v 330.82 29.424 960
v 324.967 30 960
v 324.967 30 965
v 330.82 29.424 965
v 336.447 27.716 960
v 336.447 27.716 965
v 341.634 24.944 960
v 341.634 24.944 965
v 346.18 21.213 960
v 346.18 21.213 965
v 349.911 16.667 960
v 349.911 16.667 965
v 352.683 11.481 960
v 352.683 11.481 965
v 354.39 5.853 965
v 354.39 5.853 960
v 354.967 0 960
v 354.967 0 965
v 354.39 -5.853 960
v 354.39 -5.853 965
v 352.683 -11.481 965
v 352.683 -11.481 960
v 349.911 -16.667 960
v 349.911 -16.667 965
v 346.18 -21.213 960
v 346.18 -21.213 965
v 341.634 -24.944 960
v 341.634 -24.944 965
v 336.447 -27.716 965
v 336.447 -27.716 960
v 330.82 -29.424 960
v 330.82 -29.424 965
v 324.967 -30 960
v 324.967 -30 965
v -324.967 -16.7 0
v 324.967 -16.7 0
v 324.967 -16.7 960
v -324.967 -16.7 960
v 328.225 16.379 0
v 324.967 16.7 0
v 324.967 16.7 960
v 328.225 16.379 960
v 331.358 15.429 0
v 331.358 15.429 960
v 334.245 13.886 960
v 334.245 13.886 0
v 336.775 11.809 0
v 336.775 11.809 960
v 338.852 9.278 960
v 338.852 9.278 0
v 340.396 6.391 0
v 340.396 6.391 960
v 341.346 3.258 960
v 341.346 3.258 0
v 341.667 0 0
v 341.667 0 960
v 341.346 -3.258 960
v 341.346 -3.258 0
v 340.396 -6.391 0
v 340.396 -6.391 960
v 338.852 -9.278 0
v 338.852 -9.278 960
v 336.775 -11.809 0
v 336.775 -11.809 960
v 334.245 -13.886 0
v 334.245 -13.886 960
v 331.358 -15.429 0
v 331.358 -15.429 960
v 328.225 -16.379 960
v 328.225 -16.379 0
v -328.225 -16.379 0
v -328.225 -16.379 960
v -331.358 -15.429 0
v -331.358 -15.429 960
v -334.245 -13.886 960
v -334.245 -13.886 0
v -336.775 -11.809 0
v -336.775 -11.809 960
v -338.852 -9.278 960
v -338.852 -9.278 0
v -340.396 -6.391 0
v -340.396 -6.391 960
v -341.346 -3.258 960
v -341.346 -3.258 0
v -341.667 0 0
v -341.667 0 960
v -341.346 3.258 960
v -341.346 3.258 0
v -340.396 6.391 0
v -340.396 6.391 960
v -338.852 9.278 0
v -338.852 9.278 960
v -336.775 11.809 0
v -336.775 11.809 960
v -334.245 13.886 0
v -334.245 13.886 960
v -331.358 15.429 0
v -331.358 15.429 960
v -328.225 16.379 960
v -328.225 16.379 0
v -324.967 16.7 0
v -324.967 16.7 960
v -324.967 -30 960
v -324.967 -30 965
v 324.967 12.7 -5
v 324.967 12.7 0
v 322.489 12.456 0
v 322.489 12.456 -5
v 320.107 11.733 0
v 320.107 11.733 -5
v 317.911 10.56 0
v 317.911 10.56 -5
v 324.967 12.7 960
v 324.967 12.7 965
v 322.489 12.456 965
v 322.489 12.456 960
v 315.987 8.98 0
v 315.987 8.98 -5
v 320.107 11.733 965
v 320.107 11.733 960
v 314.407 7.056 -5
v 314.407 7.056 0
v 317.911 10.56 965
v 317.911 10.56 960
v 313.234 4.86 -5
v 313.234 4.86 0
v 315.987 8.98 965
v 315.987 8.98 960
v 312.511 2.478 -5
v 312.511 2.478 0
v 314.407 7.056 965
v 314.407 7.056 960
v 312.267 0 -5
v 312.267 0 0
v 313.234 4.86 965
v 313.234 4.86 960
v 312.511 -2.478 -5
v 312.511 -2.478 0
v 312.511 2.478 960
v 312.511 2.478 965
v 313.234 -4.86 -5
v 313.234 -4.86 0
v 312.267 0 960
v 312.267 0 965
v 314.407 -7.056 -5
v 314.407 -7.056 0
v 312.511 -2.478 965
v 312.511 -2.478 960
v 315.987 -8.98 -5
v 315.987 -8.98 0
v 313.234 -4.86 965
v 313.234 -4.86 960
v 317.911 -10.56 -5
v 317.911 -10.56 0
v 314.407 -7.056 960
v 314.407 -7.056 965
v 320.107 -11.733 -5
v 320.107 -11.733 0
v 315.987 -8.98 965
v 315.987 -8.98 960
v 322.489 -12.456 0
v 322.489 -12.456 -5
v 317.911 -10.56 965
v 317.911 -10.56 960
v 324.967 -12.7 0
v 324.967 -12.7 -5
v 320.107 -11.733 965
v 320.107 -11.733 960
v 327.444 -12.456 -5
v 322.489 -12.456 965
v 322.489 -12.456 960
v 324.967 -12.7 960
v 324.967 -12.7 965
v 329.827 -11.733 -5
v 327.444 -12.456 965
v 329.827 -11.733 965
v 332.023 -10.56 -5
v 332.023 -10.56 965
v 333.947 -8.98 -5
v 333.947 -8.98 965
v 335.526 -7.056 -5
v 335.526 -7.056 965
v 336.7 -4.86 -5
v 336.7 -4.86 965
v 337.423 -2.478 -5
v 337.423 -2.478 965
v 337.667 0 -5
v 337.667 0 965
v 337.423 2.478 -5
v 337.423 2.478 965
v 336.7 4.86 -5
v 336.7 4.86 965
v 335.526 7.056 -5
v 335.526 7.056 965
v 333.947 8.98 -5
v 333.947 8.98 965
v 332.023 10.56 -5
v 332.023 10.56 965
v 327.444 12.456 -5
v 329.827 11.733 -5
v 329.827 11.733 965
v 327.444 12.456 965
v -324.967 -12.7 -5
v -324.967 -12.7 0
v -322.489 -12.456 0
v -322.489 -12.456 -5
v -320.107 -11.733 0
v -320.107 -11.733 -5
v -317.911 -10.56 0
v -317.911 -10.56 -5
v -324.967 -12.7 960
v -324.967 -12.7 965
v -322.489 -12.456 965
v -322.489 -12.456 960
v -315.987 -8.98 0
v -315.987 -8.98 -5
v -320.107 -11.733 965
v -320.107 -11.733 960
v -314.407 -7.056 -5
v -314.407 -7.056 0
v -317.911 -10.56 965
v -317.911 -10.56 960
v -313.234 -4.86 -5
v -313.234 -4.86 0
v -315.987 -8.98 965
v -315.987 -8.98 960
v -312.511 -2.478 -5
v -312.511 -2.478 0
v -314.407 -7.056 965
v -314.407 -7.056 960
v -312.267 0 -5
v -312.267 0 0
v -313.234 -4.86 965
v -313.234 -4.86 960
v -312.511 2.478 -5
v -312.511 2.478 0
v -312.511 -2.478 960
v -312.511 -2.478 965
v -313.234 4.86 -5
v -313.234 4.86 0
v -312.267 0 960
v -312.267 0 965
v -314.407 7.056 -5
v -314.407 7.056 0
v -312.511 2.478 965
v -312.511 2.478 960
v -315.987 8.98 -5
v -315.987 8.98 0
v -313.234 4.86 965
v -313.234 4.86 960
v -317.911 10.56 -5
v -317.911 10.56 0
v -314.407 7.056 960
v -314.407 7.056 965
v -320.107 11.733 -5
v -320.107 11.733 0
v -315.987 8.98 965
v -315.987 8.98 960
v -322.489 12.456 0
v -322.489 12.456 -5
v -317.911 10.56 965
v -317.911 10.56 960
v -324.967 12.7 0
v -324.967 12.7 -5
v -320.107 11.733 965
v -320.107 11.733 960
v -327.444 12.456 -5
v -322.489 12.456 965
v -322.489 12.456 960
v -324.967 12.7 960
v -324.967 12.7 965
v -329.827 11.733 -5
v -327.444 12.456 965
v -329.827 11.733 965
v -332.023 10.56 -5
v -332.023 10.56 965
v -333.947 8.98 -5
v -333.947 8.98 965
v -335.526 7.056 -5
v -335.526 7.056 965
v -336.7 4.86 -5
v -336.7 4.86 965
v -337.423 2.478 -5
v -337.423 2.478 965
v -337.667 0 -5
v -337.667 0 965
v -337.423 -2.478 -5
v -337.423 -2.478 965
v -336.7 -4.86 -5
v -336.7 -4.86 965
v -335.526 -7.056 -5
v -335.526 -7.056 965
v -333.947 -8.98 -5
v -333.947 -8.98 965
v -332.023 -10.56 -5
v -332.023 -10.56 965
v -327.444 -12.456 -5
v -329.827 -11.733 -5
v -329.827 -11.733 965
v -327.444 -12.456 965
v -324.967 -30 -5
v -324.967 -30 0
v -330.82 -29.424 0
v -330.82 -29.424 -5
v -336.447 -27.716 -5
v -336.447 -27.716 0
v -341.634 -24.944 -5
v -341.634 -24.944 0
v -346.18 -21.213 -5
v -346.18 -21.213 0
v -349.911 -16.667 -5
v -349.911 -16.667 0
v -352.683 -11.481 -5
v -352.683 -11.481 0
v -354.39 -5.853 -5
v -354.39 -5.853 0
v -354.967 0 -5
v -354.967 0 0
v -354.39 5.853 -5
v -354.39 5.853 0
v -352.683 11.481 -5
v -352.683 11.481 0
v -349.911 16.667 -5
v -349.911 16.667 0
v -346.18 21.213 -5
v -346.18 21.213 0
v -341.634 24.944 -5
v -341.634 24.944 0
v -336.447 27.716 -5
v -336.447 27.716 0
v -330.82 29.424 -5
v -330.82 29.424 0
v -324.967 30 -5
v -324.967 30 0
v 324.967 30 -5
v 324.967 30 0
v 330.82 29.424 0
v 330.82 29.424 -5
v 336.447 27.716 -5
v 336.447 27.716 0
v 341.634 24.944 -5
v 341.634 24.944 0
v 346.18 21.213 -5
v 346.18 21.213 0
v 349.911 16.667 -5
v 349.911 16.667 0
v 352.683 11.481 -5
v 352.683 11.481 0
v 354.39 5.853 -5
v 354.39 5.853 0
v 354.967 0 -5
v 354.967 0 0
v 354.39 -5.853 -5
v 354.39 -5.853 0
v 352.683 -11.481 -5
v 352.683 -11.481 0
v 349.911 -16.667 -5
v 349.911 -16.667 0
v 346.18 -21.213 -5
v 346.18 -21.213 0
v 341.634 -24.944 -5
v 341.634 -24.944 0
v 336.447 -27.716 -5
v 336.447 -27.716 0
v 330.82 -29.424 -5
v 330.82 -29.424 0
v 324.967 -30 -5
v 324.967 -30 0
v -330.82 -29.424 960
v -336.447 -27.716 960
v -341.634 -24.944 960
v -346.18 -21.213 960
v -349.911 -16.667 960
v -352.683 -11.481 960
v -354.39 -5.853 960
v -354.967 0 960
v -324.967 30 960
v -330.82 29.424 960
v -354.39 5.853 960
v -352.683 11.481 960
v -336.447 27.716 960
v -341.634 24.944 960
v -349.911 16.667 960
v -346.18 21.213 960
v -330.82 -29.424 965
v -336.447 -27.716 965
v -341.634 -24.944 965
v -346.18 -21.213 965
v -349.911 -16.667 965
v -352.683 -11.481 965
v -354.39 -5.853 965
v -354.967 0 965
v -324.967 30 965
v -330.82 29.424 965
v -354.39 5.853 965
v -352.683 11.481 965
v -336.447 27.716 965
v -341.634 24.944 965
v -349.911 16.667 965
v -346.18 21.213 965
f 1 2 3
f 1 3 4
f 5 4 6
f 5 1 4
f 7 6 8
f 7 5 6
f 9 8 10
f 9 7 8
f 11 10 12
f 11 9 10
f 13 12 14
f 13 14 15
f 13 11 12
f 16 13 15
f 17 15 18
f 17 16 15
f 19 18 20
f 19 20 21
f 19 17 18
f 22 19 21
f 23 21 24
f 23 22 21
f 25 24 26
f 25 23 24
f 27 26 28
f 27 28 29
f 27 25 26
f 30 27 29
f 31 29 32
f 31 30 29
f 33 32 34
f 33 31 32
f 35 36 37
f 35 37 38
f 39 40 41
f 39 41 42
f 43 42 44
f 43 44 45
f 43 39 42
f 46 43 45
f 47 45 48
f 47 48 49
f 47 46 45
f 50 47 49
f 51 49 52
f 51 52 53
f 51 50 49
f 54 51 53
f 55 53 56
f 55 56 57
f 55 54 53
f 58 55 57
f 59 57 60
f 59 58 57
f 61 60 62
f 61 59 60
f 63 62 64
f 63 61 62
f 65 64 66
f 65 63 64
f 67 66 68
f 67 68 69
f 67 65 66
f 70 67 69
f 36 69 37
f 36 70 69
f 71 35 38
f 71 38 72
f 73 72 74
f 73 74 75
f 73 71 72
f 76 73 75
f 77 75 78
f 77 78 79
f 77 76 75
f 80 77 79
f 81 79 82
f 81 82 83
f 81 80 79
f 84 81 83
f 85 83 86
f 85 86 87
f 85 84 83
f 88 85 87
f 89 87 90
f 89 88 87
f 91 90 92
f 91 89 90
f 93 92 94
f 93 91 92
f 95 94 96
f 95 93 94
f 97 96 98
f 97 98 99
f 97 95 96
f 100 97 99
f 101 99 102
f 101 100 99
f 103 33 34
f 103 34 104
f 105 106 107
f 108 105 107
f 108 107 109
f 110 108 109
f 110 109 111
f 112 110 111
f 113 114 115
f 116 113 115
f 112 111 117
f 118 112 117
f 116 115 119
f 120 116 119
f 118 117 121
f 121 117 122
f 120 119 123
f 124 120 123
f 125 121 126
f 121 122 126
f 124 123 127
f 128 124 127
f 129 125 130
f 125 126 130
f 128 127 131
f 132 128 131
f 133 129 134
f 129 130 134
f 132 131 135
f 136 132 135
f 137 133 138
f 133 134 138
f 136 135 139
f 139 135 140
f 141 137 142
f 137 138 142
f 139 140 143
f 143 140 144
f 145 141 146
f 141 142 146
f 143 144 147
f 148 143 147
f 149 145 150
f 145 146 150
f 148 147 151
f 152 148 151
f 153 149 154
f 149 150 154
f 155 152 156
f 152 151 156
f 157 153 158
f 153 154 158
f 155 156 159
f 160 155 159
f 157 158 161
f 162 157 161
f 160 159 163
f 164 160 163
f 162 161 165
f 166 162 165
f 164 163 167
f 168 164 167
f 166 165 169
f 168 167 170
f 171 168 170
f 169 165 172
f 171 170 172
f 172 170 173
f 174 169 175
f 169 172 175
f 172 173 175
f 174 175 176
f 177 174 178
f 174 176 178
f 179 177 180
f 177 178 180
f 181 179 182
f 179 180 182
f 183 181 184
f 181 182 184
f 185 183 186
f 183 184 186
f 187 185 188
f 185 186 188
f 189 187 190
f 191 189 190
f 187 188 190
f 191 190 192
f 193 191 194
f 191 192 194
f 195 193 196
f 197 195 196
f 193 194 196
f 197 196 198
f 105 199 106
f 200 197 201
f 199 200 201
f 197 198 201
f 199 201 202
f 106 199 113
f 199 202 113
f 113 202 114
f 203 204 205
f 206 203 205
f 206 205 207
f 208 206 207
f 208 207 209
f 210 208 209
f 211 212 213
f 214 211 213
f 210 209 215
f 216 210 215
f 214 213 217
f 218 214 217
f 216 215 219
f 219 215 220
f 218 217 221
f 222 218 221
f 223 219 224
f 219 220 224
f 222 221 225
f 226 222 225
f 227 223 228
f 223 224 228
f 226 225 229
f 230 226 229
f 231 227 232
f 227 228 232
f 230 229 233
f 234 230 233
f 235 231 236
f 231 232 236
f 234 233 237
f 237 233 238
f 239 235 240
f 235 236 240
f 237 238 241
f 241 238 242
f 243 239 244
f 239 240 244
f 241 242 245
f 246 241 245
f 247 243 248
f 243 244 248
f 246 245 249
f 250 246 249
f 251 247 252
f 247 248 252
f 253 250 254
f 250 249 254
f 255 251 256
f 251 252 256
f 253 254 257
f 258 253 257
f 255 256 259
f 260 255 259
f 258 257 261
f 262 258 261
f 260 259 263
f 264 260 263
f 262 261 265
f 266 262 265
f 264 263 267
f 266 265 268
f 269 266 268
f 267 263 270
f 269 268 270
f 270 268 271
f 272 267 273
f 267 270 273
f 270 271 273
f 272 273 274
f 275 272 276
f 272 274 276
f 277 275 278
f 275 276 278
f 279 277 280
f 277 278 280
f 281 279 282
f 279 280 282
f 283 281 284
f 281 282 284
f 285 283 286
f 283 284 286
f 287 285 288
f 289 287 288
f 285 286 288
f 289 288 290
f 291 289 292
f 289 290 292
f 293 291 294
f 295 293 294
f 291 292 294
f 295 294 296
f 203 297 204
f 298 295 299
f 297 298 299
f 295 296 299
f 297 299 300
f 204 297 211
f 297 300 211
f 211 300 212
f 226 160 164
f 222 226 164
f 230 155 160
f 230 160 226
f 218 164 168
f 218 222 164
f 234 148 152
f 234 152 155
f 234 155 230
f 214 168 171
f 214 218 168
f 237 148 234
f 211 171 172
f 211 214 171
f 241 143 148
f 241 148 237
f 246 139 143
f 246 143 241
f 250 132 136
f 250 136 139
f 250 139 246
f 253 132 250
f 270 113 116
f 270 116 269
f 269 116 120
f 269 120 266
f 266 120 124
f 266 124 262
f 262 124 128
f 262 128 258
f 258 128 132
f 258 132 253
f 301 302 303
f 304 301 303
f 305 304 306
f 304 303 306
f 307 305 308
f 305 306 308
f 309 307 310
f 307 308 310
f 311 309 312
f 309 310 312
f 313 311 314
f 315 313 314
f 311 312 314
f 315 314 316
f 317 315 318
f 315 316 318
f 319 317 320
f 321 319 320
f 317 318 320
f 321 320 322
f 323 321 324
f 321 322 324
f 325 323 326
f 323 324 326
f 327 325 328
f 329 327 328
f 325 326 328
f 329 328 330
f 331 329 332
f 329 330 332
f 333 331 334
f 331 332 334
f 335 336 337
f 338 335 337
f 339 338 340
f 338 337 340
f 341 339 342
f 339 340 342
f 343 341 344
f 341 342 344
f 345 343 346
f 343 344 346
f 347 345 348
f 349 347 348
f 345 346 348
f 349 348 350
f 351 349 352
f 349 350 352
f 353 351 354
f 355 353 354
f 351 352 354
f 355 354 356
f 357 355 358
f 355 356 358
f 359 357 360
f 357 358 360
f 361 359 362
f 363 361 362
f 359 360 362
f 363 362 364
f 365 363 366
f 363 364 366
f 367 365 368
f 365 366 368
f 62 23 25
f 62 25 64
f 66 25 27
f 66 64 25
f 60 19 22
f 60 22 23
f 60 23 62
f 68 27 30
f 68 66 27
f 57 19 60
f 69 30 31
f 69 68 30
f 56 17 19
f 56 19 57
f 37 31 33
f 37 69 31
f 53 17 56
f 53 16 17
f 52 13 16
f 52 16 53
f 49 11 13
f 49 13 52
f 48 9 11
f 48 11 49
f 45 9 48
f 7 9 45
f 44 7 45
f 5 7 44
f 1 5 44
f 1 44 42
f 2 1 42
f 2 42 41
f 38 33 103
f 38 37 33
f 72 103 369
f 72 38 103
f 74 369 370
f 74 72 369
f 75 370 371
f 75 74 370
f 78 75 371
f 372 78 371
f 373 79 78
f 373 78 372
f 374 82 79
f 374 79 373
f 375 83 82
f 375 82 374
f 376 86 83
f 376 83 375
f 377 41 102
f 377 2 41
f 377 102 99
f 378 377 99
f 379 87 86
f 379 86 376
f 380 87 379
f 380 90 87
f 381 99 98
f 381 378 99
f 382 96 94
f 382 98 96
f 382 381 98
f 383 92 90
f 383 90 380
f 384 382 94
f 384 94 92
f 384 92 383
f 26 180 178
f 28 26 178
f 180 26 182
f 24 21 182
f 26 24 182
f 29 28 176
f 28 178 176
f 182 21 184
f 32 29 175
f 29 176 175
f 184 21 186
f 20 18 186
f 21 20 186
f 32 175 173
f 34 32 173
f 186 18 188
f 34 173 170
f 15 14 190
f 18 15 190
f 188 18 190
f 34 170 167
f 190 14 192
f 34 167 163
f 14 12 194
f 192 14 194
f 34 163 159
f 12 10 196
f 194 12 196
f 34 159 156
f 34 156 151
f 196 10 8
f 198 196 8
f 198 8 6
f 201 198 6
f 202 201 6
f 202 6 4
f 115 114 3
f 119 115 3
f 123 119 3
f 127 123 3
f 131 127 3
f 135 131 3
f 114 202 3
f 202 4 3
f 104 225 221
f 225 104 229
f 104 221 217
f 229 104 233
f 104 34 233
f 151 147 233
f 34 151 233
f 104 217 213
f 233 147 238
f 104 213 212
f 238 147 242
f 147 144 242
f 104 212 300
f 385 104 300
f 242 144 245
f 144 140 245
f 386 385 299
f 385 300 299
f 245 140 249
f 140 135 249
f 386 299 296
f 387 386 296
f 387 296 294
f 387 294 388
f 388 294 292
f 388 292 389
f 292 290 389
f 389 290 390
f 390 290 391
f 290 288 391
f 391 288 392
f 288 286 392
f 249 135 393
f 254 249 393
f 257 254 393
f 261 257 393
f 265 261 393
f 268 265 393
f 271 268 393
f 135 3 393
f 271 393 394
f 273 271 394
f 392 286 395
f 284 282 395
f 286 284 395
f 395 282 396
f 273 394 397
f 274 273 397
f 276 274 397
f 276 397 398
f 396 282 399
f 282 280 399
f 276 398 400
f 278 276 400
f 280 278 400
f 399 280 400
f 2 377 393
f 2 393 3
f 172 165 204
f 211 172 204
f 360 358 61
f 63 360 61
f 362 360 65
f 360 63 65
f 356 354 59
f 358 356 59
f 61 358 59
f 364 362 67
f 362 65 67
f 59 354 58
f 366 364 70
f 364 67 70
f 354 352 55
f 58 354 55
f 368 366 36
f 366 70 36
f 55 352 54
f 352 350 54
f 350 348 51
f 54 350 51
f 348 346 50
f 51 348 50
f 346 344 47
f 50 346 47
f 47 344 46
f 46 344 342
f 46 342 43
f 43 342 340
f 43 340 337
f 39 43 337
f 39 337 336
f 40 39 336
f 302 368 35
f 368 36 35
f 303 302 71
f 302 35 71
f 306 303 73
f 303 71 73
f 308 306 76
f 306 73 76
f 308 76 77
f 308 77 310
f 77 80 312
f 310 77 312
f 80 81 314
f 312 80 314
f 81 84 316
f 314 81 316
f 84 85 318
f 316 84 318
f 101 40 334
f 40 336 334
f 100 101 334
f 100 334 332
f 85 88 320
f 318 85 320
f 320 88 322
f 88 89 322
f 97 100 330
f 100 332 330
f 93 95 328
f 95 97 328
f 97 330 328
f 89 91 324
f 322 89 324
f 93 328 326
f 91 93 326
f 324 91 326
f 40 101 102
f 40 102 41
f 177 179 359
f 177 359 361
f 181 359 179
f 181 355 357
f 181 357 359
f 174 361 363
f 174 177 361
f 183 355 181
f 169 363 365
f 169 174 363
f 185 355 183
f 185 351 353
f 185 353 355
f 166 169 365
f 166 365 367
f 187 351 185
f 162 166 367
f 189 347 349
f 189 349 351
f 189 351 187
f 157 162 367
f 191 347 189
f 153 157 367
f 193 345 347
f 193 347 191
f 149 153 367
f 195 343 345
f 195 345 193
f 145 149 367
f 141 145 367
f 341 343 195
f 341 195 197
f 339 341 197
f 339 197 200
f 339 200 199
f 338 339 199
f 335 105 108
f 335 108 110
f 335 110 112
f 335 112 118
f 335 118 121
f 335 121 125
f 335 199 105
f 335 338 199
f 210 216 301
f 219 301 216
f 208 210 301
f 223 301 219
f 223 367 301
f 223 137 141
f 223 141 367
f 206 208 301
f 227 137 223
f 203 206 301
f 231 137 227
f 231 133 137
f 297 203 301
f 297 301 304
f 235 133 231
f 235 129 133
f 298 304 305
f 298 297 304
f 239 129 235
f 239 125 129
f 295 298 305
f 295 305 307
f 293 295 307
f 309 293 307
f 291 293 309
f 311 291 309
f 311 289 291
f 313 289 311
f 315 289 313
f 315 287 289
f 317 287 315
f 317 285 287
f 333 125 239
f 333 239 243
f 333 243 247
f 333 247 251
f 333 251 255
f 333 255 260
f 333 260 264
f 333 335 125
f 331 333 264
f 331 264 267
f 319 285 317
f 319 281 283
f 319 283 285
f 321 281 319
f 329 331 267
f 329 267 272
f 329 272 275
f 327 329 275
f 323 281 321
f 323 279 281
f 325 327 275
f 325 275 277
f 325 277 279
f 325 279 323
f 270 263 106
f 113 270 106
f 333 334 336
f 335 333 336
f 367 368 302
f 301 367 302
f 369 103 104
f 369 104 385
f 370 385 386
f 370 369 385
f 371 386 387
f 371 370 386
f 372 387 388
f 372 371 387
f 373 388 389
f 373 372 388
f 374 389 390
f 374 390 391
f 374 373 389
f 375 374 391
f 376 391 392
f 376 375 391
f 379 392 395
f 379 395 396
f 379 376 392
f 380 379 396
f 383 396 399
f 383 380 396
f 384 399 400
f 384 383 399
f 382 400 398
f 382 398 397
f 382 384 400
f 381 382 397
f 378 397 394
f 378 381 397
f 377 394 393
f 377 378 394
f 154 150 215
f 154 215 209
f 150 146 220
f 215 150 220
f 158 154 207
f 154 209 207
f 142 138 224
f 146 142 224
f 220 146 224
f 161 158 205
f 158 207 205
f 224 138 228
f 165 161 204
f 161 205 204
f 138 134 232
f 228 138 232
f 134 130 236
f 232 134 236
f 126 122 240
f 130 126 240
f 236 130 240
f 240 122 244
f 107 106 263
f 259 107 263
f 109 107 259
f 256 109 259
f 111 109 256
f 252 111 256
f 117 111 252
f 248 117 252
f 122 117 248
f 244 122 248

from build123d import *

# Parameters (mm, degrees)
BOSS_EXTRUDE1_DEPTH = 960
SKETCH2_R           = 12.7
BOSS_EXTRUDE2_DEPTH = 5


with BuildPart() as part:
    # Sketch1 → Boss-Extrude1 (new body)
    with BuildSketch(Plane.XY):
        with BuildLine():
            Line((-324.9668, 16.7), (324.9668, 16.7))
            ThreePointArc((324.9668, 16.7), (341.6668, 0), (324.9668, -16.7))
            Line((324.9668, -16.7), (-324.9668, -16.7))
            ThreePointArc((-324.9668, -16.7), (-341.6668, 0), (-324.9668, 16.7))
        make_face()
        with BuildLine():
            Line((-324.9668, 12.7), (324.9668, 12.7))
            ThreePointArc((324.9668, 12.7), (337.6668, 0), (324.9668, -12.7))
            Line((324.9668, -12.7), (-324.9668, -12.7))
            ThreePointArc((-324.9668, -12.7), (-337.6668, 0), (-324.9668, 12.7))
        make_face(mode=Mode.SUBTRACT)
    extrude(amount=BOSS_EXTRUDE1_DEPTH)

    # Sketch2 → Boss-Extrude2 (add)
    with BuildSketch(Plane.XY.offset(960)):
        with BuildLine():
            Line((-324.9668, 30), (324.9668, 30))
            ThreePointArc((324.9668, 30), (354.9668, 0), (324.9668, -30))
            Line((324.9668, -30), (-324.9668, -30))
            ThreePointArc((-324.9668, -30), (-354.9668, 0), (-324.9668, 30))
        make_face()
        with Locations(Location((324.9668, 0, 0), (0, 0, 90))):
            Circle(SKETCH2_R, mode=Mode.SUBTRACT)
        with Locations(Location((-324.9668, 0, 0), (0, 0, 270))):
            Circle(SKETCH2_R, mode=Mode.SUBTRACT)
    boss_extrude2 = extrude(amount=BOSS_EXTRUDE2_DEPTH)

    # Mirror1: Boss-Extrude2 across plane
    add(boss_extrude2.mirror(Plane.XY.offset(480)))


solid = part.part
